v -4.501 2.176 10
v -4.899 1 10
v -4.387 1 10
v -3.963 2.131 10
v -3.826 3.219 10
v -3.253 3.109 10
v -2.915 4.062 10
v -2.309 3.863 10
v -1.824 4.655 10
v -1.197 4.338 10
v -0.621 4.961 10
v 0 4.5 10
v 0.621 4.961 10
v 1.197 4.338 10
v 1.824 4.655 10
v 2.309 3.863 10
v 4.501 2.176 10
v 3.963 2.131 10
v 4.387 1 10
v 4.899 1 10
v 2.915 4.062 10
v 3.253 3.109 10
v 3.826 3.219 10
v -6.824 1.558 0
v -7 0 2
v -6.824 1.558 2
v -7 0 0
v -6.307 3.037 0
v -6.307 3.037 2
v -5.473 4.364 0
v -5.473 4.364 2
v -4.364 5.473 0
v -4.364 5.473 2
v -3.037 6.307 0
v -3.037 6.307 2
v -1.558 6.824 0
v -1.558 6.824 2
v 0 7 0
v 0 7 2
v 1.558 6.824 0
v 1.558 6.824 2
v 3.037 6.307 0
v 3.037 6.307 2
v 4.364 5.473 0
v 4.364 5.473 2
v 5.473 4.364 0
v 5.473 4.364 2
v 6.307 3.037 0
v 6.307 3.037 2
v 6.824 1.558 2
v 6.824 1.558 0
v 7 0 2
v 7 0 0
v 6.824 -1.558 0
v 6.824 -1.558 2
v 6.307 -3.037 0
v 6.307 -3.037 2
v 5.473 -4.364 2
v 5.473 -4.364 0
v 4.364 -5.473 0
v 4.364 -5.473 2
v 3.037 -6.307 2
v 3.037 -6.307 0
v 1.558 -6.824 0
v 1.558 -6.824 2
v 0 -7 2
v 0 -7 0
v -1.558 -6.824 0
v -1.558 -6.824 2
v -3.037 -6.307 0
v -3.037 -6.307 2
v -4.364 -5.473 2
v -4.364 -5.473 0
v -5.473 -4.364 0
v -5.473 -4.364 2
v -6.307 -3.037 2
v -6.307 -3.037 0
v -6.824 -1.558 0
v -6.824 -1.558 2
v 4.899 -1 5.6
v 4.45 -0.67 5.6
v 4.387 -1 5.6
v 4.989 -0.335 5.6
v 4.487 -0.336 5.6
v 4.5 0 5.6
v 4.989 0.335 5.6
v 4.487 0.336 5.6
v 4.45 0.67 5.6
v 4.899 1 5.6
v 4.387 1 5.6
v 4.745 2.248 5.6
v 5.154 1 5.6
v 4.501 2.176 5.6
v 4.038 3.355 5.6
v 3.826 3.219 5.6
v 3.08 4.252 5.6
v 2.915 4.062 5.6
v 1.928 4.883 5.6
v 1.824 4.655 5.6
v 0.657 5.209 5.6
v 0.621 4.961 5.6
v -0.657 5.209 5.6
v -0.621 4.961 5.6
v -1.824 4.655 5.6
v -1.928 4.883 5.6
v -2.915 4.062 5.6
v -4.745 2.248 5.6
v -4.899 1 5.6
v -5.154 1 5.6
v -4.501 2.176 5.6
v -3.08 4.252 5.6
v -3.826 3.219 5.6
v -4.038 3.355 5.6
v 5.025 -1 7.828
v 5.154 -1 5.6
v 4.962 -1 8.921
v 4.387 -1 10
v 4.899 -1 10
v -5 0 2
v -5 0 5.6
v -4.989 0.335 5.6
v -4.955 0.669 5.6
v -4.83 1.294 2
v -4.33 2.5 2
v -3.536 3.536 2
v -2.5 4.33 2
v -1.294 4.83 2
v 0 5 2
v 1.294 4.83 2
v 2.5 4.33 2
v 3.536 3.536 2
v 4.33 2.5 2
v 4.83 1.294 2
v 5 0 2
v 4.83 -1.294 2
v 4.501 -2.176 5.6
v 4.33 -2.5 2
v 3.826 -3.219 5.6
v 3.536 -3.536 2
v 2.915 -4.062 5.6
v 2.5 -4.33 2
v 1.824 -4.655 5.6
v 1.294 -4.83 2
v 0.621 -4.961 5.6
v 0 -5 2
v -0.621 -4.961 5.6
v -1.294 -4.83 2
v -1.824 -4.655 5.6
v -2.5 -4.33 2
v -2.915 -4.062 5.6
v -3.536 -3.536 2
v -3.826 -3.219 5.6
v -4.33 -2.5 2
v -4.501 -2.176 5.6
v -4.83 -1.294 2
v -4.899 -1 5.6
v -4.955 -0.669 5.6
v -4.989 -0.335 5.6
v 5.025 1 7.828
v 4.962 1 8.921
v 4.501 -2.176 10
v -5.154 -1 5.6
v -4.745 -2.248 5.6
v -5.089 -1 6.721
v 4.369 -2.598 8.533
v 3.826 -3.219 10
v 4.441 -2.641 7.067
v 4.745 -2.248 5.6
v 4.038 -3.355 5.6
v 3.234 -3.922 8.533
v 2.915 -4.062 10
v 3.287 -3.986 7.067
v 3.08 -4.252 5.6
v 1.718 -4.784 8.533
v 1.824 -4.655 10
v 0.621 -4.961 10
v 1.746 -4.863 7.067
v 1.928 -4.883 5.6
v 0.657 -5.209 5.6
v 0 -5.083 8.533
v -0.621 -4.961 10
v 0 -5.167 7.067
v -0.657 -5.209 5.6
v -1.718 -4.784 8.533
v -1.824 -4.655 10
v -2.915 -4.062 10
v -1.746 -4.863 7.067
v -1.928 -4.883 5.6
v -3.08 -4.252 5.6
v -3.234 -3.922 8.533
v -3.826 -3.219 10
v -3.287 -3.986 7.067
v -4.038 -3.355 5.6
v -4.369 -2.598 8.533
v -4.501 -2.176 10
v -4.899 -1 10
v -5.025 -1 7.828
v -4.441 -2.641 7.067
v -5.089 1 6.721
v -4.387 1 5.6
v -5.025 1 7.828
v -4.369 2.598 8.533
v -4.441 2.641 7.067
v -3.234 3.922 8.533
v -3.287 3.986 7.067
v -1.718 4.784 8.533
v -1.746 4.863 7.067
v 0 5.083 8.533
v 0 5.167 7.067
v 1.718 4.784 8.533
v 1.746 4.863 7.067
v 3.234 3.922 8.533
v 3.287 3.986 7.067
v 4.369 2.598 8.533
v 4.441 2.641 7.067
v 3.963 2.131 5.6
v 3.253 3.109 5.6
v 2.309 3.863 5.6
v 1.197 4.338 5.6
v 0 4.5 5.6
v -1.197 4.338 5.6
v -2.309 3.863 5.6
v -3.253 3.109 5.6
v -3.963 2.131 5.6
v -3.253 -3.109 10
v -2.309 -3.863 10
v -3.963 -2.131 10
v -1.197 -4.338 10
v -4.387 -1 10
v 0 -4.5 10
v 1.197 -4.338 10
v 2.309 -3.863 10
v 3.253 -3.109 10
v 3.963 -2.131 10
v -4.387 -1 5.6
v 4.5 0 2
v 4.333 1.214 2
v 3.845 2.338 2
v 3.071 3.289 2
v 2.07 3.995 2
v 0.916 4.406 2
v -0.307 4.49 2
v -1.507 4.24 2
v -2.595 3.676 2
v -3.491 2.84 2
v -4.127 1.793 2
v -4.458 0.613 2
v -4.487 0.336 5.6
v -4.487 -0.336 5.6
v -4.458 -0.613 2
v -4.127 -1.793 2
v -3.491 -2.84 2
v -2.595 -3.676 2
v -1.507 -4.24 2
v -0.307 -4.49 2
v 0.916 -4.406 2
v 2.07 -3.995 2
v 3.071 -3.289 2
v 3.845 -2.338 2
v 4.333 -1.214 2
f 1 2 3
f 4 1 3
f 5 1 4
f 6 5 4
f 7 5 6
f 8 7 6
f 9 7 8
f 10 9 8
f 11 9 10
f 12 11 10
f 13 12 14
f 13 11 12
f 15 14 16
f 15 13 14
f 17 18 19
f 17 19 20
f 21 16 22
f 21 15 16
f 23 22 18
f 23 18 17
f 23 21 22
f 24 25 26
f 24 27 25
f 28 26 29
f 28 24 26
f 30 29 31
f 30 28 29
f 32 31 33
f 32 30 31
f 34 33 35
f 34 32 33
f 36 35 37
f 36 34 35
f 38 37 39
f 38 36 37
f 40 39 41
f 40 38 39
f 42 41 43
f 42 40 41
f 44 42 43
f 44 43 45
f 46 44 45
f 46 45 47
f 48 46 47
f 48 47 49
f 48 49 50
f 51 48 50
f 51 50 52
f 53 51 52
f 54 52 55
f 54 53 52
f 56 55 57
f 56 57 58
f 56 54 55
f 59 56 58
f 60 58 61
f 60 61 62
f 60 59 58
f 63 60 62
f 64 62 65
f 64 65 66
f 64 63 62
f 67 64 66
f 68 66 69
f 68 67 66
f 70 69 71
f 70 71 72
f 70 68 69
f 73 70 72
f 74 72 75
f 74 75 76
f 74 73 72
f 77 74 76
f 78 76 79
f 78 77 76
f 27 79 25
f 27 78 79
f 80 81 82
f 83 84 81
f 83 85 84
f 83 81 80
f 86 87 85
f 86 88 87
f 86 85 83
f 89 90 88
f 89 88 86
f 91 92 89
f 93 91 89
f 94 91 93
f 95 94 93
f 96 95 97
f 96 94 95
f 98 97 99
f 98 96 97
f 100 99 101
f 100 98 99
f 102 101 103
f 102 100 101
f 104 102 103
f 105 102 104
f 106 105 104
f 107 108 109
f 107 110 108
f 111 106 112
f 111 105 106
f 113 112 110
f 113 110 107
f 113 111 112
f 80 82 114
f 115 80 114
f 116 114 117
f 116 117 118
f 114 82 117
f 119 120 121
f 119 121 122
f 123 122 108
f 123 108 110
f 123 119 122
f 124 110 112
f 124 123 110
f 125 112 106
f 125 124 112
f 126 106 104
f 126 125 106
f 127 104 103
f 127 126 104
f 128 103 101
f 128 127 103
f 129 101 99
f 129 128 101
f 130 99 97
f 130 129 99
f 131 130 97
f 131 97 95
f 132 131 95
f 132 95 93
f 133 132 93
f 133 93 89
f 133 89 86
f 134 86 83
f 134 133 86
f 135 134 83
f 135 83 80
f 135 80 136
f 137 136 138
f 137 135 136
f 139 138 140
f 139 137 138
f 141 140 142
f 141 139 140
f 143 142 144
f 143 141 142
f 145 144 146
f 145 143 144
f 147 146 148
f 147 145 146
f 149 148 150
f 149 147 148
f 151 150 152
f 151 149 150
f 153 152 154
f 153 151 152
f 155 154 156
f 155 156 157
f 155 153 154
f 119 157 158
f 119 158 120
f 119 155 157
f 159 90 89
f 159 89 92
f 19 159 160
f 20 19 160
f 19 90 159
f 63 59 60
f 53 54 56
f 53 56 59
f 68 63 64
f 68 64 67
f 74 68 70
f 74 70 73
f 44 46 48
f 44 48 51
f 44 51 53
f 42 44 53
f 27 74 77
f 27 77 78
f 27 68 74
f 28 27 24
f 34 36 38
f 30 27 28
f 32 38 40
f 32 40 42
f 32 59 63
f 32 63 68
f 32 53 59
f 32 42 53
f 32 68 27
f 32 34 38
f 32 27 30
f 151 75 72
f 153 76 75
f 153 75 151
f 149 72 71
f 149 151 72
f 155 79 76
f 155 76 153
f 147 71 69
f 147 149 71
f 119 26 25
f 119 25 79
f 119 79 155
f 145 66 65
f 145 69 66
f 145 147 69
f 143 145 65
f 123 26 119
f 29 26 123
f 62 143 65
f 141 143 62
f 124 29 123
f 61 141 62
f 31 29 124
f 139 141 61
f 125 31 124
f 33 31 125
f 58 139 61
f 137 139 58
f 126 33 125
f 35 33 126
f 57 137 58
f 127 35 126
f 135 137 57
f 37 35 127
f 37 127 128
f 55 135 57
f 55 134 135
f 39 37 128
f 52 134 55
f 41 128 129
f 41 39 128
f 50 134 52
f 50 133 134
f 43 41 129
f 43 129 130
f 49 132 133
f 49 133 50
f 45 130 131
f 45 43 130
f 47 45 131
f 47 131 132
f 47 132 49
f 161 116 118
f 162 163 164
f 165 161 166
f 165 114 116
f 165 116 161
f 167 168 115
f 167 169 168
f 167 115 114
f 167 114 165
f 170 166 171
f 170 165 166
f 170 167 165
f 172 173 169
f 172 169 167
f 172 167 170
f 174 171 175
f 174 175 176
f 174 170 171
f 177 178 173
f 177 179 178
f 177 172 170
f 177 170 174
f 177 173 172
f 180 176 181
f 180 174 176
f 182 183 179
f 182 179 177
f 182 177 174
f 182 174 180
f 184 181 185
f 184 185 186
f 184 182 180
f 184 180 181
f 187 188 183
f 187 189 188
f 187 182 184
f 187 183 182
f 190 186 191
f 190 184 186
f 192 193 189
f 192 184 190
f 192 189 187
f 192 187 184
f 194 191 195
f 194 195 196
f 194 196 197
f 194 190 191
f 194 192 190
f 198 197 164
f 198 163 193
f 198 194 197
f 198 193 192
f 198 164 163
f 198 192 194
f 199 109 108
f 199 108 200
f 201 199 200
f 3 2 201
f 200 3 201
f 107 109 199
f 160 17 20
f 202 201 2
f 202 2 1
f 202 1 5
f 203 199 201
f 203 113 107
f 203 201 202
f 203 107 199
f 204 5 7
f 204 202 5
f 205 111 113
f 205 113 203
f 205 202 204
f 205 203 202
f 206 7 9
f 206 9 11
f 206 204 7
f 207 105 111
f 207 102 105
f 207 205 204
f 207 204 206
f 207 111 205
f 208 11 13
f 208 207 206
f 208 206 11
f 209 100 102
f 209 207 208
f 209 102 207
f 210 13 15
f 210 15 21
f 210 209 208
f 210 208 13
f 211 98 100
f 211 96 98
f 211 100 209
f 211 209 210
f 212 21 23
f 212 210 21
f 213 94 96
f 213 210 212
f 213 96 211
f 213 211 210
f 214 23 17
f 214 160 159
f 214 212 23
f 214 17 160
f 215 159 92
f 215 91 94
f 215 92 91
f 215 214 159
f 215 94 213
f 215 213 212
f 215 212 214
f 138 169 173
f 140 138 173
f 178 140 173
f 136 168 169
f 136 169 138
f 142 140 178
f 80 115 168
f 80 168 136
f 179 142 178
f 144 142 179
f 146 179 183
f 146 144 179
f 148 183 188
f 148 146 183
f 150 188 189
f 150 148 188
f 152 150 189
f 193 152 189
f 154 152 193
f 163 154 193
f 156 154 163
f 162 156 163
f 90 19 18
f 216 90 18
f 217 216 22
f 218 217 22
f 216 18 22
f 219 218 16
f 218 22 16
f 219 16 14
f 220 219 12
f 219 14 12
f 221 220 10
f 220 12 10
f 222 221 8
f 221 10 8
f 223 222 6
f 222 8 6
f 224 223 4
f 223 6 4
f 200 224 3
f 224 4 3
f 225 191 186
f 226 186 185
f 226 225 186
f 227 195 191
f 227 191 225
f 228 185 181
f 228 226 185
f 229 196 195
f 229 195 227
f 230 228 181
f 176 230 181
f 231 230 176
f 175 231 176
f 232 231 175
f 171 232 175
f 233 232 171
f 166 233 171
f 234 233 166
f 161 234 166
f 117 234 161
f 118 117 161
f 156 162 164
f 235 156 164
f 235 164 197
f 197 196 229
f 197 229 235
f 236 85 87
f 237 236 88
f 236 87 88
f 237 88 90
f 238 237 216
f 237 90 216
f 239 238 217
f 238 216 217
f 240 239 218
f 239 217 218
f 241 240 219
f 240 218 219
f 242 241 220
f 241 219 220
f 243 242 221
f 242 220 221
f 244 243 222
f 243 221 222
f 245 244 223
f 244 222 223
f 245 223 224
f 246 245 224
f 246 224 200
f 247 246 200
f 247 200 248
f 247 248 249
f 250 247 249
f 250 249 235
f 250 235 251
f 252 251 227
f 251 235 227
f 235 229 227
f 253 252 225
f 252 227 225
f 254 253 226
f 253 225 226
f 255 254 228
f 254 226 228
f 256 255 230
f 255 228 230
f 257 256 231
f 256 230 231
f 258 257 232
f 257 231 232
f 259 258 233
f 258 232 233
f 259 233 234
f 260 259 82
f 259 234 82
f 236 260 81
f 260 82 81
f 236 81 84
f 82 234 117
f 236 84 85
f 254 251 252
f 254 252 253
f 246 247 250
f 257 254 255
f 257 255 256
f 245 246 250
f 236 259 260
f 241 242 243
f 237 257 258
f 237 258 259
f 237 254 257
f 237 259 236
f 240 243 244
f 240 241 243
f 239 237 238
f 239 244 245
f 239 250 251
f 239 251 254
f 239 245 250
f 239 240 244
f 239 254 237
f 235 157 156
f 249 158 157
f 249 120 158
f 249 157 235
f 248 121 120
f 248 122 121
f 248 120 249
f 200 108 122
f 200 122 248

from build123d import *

# Parameters (mm, degrees)
F2_R     = 4.5
F3_DEPTH = 8
F4_W     = 30
F4_H     = 2
F5_DEPTH = 4.4


with BuildPart() as f1:
    # F0 (on Front) → F1 (revolve)
    with BuildSketch(Plane.XZ):
        Polygon((-7, 0), (0, 0), (0, 10), (-5, 10), (-5.25, 5.6), (-5, 5.6), (-5, 2), (-7, 2), align=None)
    revolve(axis=Axis((0, 0, 5), (0, 0, -1)))

    # F2 (on face) → F3 (cut)
    with BuildSketch(Plane.XY.offset(10)):
        Circle(F2_R)
    extrude(amount=-F3_DEPTH, mode=Mode.SUBTRACT)

    # F4 (on face) → F5 (cut)
    with BuildSketch(Plane.XY.offset(10)):
        with Locations((0.8593, 0)):
            Rectangle(F4_W, F4_H)
        with BuildLine():
            Line((-4.387482, 1), (4.387482, 1))
            ThreePointArc((4.387482, 1), (0, 4.5), (-4.387482, 1))
        make_face()
        with BuildLine():
            Line((15.8593, -1), (15.8593, 1))
            Line((15.8593, 1), (4.387482, 1))
            ThreePointArc((4.387482, 1), (4.471782, 0.503155), (4.5, 0))
            ThreePointArc((4.5, 0), (4.471782, -0.503155), (4.387482, -1))
            Line((4.387482, -1), (15.8593, -1))
        make_face()
    extrude(amount=-F5_DEPTH, mode=Mode.SUBTRACT)


solid = f1.part
